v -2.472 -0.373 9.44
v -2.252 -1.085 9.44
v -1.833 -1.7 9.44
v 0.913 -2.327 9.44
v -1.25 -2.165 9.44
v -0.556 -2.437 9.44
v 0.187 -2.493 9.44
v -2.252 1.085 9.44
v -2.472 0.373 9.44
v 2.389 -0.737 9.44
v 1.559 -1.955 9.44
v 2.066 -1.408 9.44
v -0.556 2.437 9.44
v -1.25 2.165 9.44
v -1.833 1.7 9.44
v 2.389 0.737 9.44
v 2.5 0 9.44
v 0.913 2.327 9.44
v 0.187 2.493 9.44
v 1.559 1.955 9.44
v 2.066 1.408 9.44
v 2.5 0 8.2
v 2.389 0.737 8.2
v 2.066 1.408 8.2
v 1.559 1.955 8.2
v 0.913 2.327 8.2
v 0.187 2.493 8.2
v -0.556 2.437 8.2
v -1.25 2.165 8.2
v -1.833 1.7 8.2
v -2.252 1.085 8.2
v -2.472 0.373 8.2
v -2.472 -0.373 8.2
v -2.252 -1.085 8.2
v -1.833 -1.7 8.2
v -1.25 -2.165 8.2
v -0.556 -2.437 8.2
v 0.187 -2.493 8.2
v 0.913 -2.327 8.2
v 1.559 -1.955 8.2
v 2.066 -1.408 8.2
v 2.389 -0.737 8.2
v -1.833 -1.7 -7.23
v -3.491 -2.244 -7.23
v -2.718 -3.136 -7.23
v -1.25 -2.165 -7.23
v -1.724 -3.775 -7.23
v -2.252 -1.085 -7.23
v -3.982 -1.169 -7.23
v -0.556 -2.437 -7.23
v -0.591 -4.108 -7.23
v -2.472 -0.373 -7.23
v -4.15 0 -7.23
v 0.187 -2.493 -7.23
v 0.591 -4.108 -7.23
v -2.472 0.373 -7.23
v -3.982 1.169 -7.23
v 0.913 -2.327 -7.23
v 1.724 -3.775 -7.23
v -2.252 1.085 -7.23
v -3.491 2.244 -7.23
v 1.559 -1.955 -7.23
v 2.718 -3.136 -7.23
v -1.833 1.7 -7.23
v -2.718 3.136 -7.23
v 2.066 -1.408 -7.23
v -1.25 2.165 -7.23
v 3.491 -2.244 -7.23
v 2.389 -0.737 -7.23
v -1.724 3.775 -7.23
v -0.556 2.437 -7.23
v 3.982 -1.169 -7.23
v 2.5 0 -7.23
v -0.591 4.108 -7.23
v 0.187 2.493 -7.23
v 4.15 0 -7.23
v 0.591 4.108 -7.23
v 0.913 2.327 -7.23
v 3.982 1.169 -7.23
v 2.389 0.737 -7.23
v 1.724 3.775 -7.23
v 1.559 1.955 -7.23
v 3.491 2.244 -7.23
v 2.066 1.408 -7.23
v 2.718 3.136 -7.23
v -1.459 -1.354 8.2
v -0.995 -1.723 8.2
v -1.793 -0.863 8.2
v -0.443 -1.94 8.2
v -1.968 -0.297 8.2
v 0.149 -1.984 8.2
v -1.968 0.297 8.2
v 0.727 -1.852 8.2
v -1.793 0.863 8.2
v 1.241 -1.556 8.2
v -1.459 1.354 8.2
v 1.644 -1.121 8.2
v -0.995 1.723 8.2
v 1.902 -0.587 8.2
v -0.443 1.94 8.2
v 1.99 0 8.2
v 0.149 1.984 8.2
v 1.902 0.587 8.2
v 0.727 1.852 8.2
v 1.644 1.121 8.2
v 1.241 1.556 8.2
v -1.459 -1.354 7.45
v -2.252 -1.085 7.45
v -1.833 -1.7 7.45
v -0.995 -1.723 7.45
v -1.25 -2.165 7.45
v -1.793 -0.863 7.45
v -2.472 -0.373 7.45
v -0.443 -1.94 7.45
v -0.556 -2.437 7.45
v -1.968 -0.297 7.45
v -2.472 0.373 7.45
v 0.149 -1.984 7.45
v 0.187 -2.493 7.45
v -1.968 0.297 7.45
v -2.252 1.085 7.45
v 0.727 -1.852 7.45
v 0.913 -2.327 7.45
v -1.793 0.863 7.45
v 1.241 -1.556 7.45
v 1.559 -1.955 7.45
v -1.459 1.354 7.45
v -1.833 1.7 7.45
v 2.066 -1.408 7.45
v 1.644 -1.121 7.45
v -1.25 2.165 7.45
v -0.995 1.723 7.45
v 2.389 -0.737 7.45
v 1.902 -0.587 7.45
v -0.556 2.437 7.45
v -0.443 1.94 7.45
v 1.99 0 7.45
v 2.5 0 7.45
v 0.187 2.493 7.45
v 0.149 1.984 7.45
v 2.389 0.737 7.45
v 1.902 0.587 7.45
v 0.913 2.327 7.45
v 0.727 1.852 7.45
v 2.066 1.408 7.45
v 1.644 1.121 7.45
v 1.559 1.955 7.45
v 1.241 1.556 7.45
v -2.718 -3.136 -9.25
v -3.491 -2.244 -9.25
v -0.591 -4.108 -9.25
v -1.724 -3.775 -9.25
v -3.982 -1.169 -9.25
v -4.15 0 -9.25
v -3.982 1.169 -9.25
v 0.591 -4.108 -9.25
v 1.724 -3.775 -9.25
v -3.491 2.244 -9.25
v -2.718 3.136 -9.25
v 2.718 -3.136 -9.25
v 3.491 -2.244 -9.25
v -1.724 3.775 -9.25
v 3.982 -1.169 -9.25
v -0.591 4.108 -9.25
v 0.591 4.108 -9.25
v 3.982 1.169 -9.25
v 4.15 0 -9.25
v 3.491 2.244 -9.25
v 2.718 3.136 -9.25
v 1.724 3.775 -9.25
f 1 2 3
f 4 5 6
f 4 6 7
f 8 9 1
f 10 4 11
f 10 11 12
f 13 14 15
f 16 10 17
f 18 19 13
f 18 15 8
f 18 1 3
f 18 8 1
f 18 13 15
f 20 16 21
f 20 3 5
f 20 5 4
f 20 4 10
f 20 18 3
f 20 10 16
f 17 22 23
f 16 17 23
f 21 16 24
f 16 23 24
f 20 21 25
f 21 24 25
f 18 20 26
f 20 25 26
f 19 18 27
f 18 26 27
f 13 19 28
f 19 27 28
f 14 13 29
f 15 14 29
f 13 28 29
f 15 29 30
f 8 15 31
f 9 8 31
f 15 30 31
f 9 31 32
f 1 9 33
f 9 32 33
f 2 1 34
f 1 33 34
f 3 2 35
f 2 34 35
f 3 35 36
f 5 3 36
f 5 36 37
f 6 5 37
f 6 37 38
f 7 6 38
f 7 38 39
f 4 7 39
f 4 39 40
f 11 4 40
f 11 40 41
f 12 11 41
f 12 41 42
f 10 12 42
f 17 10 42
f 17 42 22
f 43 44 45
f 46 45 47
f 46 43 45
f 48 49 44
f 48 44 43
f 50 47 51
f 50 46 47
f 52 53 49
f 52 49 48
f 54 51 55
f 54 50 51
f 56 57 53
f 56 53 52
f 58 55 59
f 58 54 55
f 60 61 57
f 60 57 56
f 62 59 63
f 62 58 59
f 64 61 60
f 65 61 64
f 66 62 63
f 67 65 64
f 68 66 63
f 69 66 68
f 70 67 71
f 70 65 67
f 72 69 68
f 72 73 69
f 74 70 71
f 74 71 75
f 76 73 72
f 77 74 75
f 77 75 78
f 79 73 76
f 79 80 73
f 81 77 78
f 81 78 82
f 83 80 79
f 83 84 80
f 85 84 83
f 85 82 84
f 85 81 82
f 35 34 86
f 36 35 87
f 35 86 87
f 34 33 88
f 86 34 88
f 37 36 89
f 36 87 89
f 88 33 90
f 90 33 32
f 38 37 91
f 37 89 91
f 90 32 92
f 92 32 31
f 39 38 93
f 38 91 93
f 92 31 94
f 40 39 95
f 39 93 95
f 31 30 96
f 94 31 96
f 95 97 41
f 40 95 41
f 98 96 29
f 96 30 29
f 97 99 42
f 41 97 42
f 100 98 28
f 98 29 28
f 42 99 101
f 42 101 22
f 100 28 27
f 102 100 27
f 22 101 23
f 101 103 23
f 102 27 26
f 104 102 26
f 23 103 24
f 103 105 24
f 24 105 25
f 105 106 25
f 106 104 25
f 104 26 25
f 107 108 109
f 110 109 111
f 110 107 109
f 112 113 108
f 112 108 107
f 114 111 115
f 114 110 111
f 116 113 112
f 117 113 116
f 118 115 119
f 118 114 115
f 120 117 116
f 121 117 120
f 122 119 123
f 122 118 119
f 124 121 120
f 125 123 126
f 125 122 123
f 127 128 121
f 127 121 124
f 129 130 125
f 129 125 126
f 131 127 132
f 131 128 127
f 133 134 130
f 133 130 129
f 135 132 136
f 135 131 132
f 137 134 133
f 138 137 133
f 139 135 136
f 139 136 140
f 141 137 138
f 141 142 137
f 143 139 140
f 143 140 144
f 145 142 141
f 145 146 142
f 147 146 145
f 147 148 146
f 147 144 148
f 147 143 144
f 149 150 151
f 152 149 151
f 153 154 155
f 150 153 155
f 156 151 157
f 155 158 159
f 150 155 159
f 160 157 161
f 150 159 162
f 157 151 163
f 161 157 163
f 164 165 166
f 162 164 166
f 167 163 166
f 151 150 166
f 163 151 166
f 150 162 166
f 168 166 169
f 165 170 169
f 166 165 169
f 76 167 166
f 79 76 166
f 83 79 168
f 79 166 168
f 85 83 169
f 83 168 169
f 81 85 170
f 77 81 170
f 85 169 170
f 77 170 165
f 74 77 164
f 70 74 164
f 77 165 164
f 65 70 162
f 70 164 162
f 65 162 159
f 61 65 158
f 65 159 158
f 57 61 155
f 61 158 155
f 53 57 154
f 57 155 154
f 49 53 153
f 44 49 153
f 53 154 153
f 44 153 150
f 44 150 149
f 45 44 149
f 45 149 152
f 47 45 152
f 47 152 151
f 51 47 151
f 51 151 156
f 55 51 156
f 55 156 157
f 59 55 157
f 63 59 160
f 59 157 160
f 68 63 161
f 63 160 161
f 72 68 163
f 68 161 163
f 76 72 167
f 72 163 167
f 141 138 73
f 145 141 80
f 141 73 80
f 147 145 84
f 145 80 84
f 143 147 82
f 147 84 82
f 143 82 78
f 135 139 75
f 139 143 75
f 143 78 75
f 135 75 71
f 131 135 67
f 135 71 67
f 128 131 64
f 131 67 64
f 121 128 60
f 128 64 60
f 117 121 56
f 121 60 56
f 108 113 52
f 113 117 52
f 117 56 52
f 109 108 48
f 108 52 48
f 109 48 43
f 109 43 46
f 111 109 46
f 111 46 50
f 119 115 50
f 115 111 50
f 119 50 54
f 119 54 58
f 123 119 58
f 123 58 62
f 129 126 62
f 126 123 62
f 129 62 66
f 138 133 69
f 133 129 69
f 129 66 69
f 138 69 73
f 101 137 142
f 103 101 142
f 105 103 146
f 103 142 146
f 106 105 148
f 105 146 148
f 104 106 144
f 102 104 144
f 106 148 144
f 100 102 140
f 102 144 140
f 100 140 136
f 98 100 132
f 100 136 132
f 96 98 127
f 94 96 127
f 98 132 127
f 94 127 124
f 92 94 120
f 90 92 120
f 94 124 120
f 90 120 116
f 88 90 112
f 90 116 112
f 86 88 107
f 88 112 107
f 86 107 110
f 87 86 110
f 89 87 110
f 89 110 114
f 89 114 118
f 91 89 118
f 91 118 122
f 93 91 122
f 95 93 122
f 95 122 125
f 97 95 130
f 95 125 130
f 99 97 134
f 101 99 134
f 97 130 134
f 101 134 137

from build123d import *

# Parameters (mm, degrees)
F_01_START                           = -7.23
S01_SMOOTH_PIN_AND_END_MARGIN_R      = 2.5
F_01_SMOOTH_PIN_AND_END_MARGIN_DEPTH = 16.67
F_02_START                           = -9.25
S02_CLEVIS_PIN_HEAD_R                = 4.15
F_02_CLEVIS_PIN_HEAD_DEPTH           = 2.02
F_03_START                           = 7.45
S03_DE_4_RETAINING_GROOVE_R          = 2.6
S03_DE_4_RETAINING_GROOVE_R_2        = 1.99
F_03_DE_4_RETAINING_GROOVE_DEPTH     = 0.75


with BuildPart() as part:
    # S01 - Smooth pin and end margin → 01 - Smooth pin and end margin (new body)
    with BuildSketch(Plane.XY.offset(F_01_START)):
        Circle(S01_SMOOTH_PIN_AND_END_MARGIN_R)
    extrude(amount=F_01_SMOOTH_PIN_AND_END_MARGIN_DEPTH)

    # S02 - Clevis pin head → 02 - Clevis pin head (add)
    with BuildSketch(Plane.XY.offset(F_02_START)):
        Circle(S02_CLEVIS_PIN_HEAD_R)
    extrude(amount=F_02_CLEVIS_PIN_HEAD_DEPTH)

    # S03 - DE-4 retaining groove → 03 - DE-4 retaining groove (cut)
    with BuildSketch(Plane.XY.offset(F_03_START)):
        Circle(S03_DE_4_RETAINING_GROOVE_R)
        Circle(S03_DE_4_RETAINING_GROOVE_R_2, mode=Mode.SUBTRACT)
    extrude(amount=F_03_DE_4_RETAINING_GROOVE_DEPTH, mode=Mode.SUBTRACT)


solid = part.part
